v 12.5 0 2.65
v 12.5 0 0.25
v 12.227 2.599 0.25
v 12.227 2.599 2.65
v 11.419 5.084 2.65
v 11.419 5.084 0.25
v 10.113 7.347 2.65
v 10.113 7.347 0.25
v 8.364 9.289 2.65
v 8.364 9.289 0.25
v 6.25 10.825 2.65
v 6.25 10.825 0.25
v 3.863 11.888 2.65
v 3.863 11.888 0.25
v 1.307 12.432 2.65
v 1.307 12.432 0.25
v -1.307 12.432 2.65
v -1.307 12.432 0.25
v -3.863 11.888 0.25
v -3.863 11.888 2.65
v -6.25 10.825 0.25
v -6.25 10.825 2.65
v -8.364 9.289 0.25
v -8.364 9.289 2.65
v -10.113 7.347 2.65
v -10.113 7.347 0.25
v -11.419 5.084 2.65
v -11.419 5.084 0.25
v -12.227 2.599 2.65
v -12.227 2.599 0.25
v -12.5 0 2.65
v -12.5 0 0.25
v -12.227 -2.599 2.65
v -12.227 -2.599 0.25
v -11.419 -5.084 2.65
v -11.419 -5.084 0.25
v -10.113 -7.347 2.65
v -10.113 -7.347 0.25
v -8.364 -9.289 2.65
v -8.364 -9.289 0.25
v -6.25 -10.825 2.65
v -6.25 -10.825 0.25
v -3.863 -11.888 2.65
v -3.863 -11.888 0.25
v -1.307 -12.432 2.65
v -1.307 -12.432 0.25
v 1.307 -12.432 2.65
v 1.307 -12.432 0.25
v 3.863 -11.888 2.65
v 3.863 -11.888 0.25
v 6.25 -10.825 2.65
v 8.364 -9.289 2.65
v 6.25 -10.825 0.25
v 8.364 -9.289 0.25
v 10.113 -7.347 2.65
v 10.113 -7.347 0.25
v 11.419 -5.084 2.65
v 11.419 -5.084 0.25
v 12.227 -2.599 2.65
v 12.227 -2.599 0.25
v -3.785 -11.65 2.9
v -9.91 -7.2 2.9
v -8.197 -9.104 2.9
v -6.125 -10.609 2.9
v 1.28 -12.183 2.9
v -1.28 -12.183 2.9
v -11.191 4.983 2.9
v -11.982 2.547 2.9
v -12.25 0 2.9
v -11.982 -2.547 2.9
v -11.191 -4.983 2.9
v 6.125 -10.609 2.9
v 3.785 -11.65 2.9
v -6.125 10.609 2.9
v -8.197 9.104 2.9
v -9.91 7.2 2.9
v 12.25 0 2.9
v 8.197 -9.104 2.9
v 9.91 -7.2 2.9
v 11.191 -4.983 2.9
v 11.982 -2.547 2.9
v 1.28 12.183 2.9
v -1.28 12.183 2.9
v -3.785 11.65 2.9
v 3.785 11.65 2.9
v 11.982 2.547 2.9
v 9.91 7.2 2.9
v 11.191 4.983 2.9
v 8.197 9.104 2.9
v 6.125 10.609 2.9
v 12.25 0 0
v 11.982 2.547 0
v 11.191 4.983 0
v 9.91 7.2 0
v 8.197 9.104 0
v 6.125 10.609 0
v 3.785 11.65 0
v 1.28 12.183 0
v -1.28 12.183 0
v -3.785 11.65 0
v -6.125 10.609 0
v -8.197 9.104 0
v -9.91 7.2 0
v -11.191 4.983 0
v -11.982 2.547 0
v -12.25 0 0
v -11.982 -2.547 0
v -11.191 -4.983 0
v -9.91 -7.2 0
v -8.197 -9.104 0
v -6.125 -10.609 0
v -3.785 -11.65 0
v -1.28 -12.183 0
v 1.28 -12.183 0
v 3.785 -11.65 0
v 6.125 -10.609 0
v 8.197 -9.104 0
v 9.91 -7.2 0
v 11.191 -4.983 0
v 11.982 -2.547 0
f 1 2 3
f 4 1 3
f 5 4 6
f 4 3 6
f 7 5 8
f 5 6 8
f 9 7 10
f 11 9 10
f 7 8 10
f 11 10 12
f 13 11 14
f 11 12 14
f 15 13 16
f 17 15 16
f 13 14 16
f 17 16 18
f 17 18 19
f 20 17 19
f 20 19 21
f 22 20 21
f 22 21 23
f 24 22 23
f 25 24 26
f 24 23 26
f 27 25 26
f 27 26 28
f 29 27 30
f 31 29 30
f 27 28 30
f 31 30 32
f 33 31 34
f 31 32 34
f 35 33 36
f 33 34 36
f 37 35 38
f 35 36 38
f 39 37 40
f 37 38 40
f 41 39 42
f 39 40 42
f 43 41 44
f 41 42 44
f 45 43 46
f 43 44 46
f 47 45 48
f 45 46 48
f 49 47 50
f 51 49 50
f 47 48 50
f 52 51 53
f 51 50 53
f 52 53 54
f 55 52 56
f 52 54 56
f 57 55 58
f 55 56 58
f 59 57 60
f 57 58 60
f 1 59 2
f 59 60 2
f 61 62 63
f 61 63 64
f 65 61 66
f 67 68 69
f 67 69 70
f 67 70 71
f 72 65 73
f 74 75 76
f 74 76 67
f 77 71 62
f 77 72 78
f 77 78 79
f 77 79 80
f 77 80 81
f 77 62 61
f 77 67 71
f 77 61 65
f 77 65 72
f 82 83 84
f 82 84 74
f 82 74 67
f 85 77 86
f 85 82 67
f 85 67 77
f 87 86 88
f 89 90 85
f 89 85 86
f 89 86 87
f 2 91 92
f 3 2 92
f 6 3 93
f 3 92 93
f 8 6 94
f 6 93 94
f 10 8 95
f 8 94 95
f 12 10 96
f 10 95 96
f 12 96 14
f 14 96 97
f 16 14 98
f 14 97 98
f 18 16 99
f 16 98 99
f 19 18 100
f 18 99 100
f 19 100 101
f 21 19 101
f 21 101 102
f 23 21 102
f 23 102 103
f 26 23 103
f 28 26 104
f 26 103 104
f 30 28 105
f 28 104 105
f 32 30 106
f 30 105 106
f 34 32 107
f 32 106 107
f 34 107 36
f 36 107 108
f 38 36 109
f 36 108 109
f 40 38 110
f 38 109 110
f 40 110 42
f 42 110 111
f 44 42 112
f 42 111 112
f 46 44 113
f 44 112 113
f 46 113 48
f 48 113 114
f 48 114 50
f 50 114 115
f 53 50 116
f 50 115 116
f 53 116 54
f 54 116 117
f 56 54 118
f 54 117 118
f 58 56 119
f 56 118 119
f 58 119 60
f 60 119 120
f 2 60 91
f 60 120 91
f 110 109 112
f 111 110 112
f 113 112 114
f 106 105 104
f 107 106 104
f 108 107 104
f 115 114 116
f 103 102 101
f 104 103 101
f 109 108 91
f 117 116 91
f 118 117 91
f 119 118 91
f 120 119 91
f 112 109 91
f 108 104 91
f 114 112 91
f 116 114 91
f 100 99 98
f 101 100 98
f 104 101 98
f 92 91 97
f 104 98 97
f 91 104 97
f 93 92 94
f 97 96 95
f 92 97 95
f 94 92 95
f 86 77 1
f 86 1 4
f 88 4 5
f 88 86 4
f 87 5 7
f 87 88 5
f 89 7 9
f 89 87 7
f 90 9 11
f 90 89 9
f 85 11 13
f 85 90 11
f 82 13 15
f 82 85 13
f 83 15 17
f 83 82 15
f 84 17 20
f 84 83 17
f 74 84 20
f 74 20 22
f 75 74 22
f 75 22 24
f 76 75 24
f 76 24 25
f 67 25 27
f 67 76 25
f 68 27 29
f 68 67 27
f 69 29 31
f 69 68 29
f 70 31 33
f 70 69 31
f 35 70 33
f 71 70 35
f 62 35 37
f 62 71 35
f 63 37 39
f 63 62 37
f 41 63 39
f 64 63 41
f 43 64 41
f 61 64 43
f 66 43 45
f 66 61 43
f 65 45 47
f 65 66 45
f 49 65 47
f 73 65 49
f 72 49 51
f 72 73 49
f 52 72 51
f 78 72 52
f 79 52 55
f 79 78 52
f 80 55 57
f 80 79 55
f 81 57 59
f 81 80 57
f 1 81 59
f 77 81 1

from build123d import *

# Parameters (mm, degrees)
ESQUISSE1_R        = 12.5
BOSS_EXTRU_2_DEPTH = 2.9
CHANFREIN2_SIZE    = 0.25
CHANFREIN3_SIZE    = 0.25


with BuildPart() as part:
    # Esquisse1 → Boss.-Extru.2 (new body)
    with BuildSketch(Plane.XY):
        Circle(ESQUISSE1_R)
    extrude(amount=BOSS_EXTRU_2_DEPTH)

    # Chanfrein2
    chanfrein2_edges = [part.edges().sort_by_distance(p)[0] for p in [
        (-12.5, 0, 2.9),
    ]]
    chamfer(chanfrein2_edges, length=CHANFREIN2_SIZE)

    # Chanfrein3
    chanfrein3_edges = [part.edges().sort_by_distance(p)[0] for p in [
        (-12.5, 0, 0),
    ]]
    chamfer(chanfrein3_edges, length=CHANFREIN3_SIZE)


solid = part.part
